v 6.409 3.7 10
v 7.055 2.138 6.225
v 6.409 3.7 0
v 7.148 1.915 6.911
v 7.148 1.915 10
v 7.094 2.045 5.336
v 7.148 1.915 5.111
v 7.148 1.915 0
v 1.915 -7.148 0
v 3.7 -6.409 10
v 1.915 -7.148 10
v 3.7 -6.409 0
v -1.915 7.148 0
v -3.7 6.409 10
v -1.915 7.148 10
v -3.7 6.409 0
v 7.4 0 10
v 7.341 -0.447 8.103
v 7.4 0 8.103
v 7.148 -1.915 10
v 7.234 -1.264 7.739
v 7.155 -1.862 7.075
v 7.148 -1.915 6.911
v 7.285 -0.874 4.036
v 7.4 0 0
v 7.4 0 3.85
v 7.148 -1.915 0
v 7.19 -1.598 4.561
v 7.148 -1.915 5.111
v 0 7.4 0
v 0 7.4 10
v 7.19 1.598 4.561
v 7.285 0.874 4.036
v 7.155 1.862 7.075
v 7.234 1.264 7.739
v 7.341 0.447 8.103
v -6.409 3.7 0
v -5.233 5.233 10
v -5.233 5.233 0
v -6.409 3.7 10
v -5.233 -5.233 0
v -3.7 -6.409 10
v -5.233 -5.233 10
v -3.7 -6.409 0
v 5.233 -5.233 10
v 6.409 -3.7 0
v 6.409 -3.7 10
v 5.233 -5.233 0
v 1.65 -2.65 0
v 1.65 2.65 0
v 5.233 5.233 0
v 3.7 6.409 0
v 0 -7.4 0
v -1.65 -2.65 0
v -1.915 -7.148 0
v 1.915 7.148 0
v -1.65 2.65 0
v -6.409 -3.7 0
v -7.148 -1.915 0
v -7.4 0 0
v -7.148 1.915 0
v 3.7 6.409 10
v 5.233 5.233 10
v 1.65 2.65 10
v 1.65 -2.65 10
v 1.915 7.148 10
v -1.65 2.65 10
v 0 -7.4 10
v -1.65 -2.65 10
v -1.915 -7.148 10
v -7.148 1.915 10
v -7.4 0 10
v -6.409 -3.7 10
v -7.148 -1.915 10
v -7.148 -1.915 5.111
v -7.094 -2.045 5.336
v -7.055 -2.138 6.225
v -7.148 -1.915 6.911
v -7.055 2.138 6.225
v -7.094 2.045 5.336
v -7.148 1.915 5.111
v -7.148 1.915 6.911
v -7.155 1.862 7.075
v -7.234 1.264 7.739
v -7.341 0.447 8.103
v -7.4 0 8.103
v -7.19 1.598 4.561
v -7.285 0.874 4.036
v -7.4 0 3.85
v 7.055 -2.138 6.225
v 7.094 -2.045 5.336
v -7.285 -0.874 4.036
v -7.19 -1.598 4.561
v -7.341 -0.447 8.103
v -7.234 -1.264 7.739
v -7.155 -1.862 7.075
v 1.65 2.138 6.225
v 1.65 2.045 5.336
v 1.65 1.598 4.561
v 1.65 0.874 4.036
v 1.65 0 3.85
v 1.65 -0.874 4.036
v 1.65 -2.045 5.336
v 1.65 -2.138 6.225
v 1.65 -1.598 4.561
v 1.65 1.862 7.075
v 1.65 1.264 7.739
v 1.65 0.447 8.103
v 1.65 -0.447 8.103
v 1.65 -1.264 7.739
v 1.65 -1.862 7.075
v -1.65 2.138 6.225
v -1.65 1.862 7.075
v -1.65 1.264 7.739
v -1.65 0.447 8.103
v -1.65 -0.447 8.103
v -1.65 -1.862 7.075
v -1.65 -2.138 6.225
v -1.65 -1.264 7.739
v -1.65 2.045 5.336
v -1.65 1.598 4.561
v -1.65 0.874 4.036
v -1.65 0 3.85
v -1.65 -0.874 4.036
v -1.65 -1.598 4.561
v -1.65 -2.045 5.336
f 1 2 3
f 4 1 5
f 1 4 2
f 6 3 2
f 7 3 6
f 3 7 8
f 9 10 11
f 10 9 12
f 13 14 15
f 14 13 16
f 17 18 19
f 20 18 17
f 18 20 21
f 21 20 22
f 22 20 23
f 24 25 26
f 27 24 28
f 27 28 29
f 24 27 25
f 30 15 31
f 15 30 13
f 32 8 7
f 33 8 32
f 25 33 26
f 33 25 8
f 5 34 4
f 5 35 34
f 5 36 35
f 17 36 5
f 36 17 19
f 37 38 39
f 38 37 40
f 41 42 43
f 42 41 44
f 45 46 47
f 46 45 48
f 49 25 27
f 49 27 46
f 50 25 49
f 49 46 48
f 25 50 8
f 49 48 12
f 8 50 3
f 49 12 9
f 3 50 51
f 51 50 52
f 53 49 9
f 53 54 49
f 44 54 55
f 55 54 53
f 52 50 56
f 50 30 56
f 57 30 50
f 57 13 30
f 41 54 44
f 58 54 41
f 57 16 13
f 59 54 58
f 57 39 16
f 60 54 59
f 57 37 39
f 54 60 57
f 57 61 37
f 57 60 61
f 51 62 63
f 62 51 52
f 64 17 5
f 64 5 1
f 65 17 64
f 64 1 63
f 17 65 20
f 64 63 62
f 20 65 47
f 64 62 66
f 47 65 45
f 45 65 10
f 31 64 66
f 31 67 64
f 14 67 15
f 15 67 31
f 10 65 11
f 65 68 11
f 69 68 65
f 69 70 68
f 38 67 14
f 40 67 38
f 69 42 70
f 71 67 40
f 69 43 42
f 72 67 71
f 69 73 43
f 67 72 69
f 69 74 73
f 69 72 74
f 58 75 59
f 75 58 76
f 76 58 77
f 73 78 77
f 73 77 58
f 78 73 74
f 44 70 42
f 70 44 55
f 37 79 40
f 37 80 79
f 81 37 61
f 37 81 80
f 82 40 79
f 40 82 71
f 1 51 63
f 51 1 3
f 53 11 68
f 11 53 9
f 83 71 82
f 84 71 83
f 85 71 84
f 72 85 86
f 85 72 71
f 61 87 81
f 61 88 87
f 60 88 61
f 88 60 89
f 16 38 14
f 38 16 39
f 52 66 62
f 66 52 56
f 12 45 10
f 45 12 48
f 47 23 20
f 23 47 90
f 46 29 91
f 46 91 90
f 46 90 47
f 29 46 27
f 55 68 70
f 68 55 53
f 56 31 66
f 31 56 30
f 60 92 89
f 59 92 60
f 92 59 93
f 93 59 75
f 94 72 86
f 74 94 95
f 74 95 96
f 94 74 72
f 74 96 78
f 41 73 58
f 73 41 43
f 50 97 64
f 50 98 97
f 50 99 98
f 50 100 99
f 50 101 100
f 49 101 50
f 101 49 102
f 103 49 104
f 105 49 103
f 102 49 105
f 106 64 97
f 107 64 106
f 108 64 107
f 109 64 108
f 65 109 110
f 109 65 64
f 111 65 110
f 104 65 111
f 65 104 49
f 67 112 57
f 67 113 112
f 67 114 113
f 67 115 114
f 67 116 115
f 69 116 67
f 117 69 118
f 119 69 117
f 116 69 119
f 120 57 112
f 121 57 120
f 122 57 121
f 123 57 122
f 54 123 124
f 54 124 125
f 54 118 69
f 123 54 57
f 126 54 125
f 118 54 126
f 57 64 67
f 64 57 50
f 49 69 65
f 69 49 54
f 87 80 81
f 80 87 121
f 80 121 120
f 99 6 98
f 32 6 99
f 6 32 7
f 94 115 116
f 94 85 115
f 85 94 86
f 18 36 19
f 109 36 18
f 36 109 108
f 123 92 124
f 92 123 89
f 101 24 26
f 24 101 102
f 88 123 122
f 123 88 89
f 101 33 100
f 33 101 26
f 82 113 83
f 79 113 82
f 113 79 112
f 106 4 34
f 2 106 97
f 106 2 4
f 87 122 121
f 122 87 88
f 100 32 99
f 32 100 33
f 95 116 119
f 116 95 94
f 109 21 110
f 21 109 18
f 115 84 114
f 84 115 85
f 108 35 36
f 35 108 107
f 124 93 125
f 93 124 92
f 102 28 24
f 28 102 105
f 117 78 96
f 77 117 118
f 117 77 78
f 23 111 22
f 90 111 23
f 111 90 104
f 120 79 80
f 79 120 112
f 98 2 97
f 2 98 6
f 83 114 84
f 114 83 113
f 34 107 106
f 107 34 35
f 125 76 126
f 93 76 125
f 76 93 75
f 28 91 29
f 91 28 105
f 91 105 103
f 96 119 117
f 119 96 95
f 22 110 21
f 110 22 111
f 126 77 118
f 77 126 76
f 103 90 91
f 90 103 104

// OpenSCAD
module stepper() {
    translate([0,8,-9.5])
    scale([10,10,10])
    import("3dparty/StepMotorModel.stl",convexivity=4);
}

module stepper_holes(h=3,$fn=15) {
   
    cylinder(d=10,h=h);
    translate([17.5,8,0]) cylinder(d=3.5,h=h);
    translate([-17.5,8,0]) cylinder(d=3.5,h=h);

}

module shaft_holder_with_inserts(h=10, d=10,shaft_x=3, shaft_y=5, d_ins=4, h_ins=4, tolerance = 0.3, thickness=2) {
    
    //calculating minimum viable d
    shaft_larger_side =  shaft_x > shaft_y ? shaft_x : shaft_y;
    
    min_d = shaft_larger_side + 2*tolerance + (2*tolerance + h_ins) *2;
    
    
    if(min_d > d) echo("Too small holder diameter set, actual d is: ", min_d);
    actual_d = min_d > d ? min_d : d;
    
    min_h = d_ins+tolerance*2 +thickness*2;
    if(min_h > h) echo("Too small holder hight is set, actual h is: ", min_h);
    actual_h = min_h > h ? min_h : h;


    inserts_holes_rotate_direction = shaft_x > shaft_y ? [90,0,0] : [0,90,0];
    inserts_holes_translate = shaft_x > shaft_y ? 
        [0,actual_d/2,actual_h-d_ins/2-thickness] : [-actual_d/2,0,actual_h-d_ins/2-thickness];
    
    difference() {
        cylinder(d=actual_d ,h=actual_h);
        translate([0,0,actual_h/2])
        cube([shaft_x+tolerance,shaft_y+tolerance,actual_h], center=true);
        translate(inserts_holes_translate)
        rotate(inserts_holes_rotate_direction) cylinder(h=actual_d, d=d_ins+tolerance, $fn=15);
    }
}

shaft_holder_with_inserts();
